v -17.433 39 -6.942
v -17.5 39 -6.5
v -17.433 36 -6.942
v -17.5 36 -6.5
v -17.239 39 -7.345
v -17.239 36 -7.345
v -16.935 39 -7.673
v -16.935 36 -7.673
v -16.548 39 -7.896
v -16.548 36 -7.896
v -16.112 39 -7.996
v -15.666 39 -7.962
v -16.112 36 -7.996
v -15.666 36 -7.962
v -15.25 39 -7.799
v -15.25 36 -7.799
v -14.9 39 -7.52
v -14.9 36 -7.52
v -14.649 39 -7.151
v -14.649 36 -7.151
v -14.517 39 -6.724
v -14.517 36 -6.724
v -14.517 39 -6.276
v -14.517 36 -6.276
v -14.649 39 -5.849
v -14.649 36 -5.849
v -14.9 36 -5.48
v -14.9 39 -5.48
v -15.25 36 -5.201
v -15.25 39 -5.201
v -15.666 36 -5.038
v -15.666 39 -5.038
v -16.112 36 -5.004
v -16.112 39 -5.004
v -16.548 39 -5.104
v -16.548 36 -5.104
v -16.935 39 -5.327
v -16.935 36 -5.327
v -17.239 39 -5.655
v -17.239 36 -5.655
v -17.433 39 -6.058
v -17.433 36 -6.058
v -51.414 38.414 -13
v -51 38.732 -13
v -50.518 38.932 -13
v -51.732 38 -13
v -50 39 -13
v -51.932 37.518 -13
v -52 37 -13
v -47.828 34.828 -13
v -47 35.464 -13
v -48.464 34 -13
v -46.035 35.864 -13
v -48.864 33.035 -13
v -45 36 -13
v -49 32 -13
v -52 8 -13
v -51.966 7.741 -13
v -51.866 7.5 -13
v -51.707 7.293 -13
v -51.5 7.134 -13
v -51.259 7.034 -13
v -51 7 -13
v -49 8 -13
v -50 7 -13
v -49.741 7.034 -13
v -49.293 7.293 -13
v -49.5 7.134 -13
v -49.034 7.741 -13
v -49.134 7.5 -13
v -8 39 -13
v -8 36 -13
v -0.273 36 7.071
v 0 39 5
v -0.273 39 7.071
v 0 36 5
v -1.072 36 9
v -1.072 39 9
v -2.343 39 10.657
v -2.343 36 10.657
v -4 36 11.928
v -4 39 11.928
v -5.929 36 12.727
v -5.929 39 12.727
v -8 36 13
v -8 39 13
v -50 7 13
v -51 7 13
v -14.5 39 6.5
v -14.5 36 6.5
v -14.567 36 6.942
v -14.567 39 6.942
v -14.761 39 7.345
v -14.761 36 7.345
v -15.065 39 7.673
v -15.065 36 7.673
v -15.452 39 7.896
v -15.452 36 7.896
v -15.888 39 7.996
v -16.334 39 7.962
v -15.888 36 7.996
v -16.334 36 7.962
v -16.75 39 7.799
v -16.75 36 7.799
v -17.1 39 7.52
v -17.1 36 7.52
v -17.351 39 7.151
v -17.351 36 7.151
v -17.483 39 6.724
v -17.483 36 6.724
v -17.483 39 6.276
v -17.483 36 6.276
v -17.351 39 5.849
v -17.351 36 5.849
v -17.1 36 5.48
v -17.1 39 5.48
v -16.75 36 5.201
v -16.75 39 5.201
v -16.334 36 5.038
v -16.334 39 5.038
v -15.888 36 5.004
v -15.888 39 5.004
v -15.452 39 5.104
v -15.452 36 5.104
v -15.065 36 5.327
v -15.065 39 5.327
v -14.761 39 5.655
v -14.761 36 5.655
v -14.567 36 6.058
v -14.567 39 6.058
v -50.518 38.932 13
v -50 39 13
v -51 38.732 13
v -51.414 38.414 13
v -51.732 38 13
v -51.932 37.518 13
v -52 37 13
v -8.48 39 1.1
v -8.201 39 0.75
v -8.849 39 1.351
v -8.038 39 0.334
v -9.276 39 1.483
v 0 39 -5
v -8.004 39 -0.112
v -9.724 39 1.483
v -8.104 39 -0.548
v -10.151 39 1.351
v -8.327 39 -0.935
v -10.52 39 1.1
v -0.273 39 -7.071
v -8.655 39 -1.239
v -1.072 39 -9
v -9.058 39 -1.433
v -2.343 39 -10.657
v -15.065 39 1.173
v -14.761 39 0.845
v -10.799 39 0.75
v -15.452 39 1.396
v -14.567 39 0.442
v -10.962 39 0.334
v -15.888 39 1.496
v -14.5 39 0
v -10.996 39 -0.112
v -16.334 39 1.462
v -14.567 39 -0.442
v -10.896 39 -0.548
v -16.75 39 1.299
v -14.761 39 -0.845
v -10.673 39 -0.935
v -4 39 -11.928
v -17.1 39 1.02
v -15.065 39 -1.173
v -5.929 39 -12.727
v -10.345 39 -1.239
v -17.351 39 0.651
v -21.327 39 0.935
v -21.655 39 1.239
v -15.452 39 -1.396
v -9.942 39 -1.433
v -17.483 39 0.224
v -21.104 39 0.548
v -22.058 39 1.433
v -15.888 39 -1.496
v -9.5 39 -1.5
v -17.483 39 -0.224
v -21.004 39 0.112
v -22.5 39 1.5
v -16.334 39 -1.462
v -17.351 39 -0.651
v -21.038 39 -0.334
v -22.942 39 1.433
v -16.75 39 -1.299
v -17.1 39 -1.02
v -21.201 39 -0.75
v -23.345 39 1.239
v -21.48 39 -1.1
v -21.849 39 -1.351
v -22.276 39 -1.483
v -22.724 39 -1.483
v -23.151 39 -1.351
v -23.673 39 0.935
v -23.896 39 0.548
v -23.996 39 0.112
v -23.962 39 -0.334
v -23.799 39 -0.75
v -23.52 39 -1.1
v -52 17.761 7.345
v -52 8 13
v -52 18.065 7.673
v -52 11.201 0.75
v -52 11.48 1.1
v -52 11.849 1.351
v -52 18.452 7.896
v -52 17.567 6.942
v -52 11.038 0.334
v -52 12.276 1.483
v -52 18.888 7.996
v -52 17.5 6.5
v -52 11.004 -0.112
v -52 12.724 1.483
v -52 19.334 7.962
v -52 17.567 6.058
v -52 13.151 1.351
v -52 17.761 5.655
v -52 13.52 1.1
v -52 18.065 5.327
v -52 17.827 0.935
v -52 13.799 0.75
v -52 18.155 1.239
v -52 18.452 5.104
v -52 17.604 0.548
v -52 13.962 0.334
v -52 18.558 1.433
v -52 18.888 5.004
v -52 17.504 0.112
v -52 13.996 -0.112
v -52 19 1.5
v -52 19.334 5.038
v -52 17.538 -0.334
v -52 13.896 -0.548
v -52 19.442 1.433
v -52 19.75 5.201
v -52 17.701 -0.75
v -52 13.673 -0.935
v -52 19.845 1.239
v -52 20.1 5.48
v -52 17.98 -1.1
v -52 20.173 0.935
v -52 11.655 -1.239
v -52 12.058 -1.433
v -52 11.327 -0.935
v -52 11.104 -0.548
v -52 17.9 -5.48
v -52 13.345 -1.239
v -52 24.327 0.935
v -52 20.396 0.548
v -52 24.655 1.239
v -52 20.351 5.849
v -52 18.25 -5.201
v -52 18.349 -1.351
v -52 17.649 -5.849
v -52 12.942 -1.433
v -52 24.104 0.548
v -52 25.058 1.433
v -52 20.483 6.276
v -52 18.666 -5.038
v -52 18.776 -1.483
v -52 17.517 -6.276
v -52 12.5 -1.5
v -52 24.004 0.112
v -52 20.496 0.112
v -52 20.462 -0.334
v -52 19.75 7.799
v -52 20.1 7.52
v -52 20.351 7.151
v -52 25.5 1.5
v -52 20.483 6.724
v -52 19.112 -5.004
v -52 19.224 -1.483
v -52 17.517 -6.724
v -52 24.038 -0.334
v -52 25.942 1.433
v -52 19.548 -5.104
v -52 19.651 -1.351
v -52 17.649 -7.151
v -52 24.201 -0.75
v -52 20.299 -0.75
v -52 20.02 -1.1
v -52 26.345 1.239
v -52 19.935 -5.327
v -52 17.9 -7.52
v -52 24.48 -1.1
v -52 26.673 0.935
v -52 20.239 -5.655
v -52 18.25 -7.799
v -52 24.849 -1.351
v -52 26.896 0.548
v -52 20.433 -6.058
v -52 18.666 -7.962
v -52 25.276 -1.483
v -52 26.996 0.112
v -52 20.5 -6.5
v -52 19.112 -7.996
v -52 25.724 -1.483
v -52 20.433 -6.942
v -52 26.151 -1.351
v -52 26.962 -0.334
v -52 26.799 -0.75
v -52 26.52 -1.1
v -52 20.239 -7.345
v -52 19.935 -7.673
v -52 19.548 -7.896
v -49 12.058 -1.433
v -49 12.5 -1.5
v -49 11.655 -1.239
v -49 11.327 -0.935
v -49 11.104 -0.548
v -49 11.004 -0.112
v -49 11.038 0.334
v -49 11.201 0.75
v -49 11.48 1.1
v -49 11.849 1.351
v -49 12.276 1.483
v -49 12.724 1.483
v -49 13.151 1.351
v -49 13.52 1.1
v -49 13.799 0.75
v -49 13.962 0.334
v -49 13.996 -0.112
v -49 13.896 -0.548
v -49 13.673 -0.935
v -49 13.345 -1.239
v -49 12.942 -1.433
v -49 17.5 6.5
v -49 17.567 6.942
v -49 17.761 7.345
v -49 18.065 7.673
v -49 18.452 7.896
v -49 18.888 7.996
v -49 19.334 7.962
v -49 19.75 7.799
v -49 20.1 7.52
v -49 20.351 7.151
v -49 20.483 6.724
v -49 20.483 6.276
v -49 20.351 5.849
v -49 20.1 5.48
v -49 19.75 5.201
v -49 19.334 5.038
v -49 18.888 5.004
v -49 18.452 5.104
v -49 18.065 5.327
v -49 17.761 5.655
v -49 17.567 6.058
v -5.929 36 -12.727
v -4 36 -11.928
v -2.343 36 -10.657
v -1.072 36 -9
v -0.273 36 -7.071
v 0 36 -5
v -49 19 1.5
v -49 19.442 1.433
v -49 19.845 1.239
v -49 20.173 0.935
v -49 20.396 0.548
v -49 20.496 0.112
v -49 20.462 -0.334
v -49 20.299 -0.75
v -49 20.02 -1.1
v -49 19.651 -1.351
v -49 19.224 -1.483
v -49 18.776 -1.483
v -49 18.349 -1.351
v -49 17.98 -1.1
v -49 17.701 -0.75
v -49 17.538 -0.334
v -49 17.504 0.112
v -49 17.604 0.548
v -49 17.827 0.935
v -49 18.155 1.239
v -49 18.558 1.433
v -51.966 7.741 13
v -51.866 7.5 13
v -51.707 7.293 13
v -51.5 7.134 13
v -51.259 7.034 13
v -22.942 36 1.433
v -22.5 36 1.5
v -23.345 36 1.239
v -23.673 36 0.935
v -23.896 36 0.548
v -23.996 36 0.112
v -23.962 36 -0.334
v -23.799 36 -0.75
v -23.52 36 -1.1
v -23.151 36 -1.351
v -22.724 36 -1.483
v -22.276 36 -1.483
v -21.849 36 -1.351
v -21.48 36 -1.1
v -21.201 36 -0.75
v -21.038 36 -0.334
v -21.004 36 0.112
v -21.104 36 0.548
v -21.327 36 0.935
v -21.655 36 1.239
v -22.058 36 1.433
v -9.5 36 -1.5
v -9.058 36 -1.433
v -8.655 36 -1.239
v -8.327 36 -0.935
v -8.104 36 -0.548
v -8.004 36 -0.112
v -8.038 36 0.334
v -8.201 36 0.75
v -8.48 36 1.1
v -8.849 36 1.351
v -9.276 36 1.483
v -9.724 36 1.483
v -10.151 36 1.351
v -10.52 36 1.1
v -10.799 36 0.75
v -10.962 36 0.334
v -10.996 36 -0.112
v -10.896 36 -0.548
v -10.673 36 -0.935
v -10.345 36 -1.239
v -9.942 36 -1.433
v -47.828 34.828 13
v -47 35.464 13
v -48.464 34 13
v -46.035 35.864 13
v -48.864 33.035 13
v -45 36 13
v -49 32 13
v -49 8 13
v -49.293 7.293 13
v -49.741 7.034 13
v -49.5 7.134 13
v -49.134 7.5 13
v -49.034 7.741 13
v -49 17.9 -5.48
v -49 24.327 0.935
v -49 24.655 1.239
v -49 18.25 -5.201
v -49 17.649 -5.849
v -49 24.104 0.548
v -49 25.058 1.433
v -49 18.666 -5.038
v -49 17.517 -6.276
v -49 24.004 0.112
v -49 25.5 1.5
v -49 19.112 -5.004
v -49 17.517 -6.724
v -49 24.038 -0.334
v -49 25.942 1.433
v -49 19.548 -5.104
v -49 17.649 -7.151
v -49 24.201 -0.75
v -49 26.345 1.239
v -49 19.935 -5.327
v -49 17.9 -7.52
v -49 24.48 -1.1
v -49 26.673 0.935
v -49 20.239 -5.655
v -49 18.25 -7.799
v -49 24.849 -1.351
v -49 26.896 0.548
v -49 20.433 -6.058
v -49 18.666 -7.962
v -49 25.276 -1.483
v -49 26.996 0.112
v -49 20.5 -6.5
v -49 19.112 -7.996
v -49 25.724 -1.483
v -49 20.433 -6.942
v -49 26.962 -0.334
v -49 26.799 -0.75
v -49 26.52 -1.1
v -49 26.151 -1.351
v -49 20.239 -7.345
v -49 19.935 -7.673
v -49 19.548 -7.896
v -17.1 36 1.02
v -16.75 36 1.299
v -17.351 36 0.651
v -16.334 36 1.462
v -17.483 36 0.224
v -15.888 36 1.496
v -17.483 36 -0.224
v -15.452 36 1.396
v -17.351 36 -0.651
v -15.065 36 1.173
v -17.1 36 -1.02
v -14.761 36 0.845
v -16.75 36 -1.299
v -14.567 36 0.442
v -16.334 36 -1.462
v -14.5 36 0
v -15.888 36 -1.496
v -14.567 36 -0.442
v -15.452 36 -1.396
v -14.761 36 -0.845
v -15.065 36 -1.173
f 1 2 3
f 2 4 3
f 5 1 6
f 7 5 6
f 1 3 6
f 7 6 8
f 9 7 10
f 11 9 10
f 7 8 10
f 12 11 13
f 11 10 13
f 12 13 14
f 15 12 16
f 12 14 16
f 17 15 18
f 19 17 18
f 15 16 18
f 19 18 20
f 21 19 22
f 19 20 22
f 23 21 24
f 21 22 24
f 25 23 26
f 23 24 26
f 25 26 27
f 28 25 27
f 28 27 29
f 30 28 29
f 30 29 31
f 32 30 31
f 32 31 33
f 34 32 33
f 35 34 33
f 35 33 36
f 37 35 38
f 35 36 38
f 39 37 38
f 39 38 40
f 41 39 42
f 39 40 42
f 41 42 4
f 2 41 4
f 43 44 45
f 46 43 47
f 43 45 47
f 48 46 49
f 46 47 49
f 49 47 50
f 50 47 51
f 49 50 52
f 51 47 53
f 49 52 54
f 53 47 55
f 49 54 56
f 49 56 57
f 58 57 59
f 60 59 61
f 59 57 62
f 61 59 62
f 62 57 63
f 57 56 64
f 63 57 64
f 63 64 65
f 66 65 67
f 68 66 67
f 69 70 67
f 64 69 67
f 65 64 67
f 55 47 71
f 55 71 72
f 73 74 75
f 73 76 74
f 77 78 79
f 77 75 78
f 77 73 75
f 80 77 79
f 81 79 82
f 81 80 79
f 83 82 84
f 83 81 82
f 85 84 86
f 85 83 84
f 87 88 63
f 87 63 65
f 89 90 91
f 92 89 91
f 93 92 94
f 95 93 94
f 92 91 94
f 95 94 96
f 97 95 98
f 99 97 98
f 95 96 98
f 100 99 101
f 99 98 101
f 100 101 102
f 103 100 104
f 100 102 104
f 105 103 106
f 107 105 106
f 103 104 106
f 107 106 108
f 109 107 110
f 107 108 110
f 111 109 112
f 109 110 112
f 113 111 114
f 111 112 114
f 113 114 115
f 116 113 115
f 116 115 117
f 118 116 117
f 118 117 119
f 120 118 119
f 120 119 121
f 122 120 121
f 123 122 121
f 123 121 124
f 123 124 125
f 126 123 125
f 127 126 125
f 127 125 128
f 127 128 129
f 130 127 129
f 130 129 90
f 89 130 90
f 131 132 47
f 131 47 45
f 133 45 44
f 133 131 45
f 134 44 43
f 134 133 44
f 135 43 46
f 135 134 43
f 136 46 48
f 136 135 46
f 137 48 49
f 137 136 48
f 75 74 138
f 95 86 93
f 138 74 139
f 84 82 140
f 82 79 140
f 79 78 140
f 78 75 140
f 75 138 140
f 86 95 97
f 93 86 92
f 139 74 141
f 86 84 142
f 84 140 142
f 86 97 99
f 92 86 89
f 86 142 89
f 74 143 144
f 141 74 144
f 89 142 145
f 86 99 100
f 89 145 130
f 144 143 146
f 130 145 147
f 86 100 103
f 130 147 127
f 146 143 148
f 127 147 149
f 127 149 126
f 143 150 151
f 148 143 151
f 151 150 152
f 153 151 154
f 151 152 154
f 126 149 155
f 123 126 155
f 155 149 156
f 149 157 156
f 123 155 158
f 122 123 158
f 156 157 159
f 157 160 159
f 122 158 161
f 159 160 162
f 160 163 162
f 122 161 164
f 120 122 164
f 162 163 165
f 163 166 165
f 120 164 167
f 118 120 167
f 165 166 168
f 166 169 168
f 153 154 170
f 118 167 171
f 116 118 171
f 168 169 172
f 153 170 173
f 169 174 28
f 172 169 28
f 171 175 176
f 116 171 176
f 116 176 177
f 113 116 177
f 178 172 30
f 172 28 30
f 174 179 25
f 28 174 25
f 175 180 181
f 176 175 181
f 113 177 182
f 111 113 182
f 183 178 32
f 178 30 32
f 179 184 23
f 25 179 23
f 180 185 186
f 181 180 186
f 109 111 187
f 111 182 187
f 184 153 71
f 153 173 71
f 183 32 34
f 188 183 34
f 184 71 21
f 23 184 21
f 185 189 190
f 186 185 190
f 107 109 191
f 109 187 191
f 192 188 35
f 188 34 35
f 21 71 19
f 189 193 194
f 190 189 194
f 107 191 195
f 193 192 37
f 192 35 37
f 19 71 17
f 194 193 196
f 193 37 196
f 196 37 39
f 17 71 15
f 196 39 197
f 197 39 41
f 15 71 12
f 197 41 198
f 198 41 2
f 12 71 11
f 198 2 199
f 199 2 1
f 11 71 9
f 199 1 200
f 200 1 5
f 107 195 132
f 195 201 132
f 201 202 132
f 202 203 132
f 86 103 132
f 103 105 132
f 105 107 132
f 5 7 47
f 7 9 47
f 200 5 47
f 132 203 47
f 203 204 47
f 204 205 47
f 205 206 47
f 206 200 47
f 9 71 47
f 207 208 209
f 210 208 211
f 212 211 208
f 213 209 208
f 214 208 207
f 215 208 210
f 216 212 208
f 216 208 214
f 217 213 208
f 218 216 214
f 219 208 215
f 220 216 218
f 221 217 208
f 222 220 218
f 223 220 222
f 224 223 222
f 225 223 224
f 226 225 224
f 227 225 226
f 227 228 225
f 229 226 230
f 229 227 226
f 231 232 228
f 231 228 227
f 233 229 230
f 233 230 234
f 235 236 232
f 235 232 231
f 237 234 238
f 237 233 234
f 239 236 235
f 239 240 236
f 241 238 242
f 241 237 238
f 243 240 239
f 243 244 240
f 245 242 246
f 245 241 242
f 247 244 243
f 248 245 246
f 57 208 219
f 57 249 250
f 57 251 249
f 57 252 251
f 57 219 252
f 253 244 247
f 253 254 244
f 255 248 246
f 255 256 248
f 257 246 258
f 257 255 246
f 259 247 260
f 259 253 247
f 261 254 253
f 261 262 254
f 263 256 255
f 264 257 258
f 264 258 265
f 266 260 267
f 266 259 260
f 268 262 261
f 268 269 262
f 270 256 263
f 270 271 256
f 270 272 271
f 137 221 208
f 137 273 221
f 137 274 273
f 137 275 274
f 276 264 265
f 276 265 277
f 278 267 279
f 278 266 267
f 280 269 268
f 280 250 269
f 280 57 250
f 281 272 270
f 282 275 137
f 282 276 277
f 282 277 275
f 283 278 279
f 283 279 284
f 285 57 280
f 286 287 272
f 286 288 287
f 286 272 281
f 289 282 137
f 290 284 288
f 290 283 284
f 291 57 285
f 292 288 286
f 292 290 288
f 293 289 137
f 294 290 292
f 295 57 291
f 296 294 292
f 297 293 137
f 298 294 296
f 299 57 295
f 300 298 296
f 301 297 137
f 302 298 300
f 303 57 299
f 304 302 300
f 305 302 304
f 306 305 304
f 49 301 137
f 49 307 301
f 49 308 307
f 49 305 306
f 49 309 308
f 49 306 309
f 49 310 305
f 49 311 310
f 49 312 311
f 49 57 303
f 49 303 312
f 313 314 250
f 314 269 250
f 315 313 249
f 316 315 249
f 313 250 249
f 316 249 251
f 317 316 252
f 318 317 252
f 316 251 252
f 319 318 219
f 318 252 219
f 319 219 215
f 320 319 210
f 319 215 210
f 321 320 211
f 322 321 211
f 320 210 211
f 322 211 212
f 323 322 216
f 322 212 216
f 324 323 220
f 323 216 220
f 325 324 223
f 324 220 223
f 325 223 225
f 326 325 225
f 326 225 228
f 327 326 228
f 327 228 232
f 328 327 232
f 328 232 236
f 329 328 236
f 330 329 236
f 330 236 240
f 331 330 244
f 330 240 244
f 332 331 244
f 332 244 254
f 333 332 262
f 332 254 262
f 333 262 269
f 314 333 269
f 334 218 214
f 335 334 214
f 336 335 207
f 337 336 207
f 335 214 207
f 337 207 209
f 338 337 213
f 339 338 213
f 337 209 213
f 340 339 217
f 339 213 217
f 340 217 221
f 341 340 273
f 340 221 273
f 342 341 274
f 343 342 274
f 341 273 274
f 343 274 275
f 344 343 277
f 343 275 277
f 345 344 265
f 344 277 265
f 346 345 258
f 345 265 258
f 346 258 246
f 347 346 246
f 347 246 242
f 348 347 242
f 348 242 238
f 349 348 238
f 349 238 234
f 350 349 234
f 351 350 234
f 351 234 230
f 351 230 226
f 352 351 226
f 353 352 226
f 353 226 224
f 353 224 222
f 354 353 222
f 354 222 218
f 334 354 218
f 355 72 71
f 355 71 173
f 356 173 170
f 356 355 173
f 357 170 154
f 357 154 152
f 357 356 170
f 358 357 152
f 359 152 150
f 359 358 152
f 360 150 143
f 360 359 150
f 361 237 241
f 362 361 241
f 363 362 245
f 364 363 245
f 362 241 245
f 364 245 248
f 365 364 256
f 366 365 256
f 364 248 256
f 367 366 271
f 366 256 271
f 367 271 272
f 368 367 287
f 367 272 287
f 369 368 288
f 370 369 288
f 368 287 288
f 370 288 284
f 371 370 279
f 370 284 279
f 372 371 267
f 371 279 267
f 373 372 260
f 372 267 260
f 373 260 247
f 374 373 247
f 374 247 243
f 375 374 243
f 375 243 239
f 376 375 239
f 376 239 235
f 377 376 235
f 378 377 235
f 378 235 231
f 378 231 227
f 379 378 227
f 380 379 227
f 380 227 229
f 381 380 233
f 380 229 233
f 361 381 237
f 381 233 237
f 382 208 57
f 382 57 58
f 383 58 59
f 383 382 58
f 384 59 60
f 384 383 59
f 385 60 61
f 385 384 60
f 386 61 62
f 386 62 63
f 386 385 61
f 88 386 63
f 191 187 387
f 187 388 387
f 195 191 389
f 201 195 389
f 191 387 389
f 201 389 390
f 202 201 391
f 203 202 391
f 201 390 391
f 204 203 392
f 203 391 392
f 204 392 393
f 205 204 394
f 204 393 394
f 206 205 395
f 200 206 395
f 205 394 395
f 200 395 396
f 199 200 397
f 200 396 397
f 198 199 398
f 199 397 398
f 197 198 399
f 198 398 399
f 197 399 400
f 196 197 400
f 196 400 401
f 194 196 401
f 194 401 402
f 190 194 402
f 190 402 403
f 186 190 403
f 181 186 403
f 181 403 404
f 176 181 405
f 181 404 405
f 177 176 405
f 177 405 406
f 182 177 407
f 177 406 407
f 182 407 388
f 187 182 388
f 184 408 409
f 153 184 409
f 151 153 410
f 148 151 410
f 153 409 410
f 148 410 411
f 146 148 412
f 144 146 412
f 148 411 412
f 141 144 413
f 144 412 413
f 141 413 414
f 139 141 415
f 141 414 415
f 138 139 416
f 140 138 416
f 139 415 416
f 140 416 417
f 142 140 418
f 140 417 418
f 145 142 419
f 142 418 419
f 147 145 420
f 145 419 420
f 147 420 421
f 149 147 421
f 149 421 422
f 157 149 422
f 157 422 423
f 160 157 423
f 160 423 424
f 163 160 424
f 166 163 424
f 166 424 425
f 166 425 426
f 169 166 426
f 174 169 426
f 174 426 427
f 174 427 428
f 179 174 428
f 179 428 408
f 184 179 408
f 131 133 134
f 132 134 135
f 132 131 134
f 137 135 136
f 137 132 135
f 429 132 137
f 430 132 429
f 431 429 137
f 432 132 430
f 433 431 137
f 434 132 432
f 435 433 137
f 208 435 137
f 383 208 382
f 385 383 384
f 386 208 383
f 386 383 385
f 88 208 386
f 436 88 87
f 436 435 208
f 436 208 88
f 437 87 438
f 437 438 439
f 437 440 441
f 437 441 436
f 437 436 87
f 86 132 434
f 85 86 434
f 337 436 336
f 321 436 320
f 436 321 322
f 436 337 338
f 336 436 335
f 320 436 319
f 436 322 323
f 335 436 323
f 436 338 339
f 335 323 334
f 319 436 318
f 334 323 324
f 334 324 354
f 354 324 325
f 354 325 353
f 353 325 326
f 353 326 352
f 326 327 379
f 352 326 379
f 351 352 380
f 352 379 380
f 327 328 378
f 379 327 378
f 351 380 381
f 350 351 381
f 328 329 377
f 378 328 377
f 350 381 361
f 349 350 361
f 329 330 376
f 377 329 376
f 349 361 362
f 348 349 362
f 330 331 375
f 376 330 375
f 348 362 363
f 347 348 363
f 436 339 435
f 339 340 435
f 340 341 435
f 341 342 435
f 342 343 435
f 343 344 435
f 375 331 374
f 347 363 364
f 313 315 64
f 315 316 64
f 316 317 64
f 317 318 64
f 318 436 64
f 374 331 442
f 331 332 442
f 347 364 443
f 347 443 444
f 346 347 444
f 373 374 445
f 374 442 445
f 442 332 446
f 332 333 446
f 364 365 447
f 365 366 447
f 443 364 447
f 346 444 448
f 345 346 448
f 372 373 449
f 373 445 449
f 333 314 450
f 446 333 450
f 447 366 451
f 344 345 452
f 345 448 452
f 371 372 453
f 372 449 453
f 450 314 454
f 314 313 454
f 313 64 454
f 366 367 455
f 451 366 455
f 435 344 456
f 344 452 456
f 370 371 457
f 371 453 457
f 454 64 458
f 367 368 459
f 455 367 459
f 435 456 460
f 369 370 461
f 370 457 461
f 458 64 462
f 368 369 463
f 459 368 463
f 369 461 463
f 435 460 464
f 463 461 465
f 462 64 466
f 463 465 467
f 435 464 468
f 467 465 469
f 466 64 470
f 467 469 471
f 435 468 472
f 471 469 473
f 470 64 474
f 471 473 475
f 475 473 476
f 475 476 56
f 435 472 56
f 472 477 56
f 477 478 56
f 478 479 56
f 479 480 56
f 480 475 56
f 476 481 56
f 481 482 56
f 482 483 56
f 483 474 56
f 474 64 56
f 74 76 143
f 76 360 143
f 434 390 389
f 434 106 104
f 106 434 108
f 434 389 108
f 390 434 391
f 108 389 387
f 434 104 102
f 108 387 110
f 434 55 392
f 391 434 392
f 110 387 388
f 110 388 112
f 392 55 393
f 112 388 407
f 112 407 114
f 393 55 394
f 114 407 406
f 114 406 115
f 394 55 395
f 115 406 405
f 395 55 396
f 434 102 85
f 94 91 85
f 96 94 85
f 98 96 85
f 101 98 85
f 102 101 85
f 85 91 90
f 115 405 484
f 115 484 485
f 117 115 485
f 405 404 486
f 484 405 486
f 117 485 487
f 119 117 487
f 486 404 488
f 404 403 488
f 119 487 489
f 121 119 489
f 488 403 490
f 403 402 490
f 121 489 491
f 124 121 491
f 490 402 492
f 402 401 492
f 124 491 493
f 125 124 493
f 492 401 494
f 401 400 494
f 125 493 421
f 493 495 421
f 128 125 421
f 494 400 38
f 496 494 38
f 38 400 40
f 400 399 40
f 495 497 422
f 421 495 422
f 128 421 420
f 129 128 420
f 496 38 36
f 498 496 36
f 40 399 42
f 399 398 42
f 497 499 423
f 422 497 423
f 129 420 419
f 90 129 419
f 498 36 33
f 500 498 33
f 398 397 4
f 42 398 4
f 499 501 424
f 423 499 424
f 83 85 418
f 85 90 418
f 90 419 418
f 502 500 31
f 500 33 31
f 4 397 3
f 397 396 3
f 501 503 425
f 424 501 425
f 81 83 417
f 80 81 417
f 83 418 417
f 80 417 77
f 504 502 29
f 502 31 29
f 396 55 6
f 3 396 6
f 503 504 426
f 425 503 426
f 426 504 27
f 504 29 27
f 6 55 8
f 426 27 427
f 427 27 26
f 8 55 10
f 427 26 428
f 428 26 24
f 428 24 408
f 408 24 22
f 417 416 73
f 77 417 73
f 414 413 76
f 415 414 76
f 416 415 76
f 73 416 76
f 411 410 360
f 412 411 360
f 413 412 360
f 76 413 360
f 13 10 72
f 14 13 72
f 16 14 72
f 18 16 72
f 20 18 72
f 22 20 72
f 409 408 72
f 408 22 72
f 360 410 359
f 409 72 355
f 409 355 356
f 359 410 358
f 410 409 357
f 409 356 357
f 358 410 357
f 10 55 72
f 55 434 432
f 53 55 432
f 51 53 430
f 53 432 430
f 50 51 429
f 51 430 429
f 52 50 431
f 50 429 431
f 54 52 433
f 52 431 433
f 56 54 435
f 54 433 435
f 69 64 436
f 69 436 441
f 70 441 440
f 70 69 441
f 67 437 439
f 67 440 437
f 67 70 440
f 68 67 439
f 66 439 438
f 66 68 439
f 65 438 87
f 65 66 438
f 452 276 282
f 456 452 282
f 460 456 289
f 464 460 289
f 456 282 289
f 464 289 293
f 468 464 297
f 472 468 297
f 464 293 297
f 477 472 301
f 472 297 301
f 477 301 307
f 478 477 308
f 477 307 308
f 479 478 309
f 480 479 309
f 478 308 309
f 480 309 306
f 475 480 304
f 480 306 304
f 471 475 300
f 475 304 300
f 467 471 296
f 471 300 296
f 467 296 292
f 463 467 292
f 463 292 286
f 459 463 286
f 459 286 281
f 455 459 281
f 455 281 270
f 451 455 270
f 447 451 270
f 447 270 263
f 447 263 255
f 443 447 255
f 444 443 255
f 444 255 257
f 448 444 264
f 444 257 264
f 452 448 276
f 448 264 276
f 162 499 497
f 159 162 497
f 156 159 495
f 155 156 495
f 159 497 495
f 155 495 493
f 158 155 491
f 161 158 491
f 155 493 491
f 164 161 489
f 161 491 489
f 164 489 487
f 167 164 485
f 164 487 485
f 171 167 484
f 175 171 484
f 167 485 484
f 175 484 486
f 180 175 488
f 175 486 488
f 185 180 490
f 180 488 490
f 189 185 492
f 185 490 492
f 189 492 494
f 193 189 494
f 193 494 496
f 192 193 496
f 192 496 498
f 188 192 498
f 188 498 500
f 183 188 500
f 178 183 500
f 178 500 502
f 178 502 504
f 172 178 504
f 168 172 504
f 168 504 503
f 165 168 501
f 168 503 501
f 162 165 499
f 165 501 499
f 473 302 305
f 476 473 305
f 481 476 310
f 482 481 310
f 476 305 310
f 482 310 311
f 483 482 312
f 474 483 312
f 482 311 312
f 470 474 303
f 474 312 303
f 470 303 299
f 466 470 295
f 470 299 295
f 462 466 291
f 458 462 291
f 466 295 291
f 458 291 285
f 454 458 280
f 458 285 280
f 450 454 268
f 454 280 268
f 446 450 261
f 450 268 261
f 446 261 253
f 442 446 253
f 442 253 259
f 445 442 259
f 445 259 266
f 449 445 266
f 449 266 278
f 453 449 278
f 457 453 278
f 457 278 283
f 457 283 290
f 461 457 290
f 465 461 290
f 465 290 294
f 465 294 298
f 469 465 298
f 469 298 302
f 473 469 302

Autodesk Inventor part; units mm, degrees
ref_plane "YZ Plane" through (0, 0, 0) normal (1, 0, 0) x (0, 1, 0)
ref_plane "XZ Plane" through (0, 0, 0) normal (0, 1, 0) x (-1, 0, 0)
ref_plane "XY Plane" through (0, 0, 0) normal (0, 0, 1) x (1, 0, 0)
sketch "Sketch1" plane through (0, 0, 0) normal (0, 0, 1) x (1, 0, 0)
  line L0 (0, 0) -> (-49, 0)
  line L1 (-49, 0) -> (-49, 18)
  line L2 (-49, 18) -> (0, 18) construction
  line L3 (-49, 18) -> (-52, 18)
  line L4 (-52, 18) -> (-52, -3)
  line L5 (-52, -3) -> (0, -3)
  line L6 (0, -3) -> (0, 0)
  dimension "d0" = 18
  dimension "d1" = 3
  dimension "d2" = 3
  dimension "d3" = 52
extrude "Extrusion1" add sketch "Sketch1" along normal blind 10
mirror "Mirror1" about plane through (-32.0411, 1.4589, 0) normal (0, 0, -1) of "Extrusion1"
mirror "Mirror2" about plane through (-49, 18, 0) normal (0, 1, 0) of "Extrusion1", "Mirror1"
sketch "Sketch4" plane through (0, -3, -10) normal (0, 0, -1) x (-1, 0, 0)
  line L0 (0, 3) -> (49, 3) projected
  line L1 (0, 0) -> (0, 3) projected
  line L2 (52, 0) -> (0, 0) projected
  line L3 (52, 42) -> (52, 0) projected
  line L4 (52, 42) -> (0, 42) projected
  line L5 (0, 42) -> (0, 39) projected
  line L6 (0, 39) -> (49, 39) projected
  line L7 (49, 39) -> (49, 3) projected
  line L8 (0, 3) -> (49, 3) projected
  line L9 (0, 0) -> (0, 3) projected
  line L10 (52, 0) -> (0, 0) projected
  line L11 (52, 42) -> (52, 0) projected
  line L12 (52, 42) -> (0, 42) projected
  line L13 (0, 42) -> (0, 39) projected
  line L14 (0, 39) -> (49, 39) projected
  line L15 (49, 39) -> (49, 3) projected
extrude "Extrusion4" add sketch "Sketch4" along normal blind 5
mirror "Mirror3" about plane through (0, 0, 0) normal (0, 0, 1) of "Extrusion4"
sketch "Sketch11" plane through (-52, -3, -15) normal (0, -1, 0) x (1, 0, 0)
  line L0 (52, 0) -> (52, 30) projected
  line L1 (52, 30) -> (0, 30) projected
  line L2 (0, 0) -> (0, 30) projected
  line L3 (52, 0) -> (0, 0) projected
  line L4 (52, 0) -> (52, 30) projected
  line L5 (52, 30) -> (0, 30) projected
  line L6 (0, 0) -> (0, 30) projected
  line L7 (52, 0) -> (0, 0) projected
  point P0 (52, 15)
extrude "Extrusion11" cut sketch "Sketch11" against normal blind 10
sketch "Sketch13" plane through (0, 36, -15) normal (1, 0, 0) x (0, 0, -1)
  line L0 (-30, 3) -> (-28, 3)
  line L1 (-28, 3) -> (-28, -29)
  line L2 (-28, -29) -> (-30, -29)
  line L3 (-30, -29) -> (-30, 3)
  line L4 (-30, -29) -> (0, -29) projected
  point P0 (-15, -36)
  dimension "d65" = 2
extrude "Extrusion13" cut sketch "Sketch13" against normal up to next
mirror "Mirror4" about plane through (0, 0, 0) normal (0, 0, 1) of "Extrusion13"
sketch "Sketch14" plane through (-52, 7, 13) normal (-1, 0, 0) x (0, 0, 1)
  line L0 (-26, 32) -> (-26, 0) projected
  line L1 (-26, 0) -> (0, 0) projected
  line L2 (0, 32) -> (-26, 32) projected
  circle A0 centre (-13, 12) radius 6.5 construction
  line L3 (-13, 12) -> (-26, 12) construction
  line L4 (-13, 12) -> (-13, 32) construction
  circle A1 centre (-13, 12) radius 1.5
  circle A2 centre (-13, 18.5) radius 1.5
  point P0 (-13, -7)
  point P1 (-13, 0)
  dimension "d68" = 13
  dimension "d69" = 20
  dimension "d71" = 3
  dimension "d72" = 3
extrude "Extrusion14" cut sketch "Sketch14" against normal up to next
pattern_circular "Circular Pattern6" count 4 over 360 about axis through (-52, 19, 0) along (1, 0, 0) of "Extrusion14"
sketch "Sketch15" plane through (-49, 36, 13) normal (0, -1, 0) x (1, 0, 0)
  line L0 (49, -26) -> (49, 0) projected
  line L1 (49, 0) -> (0, 0) projected
  circle A0 centre (33, -13) radius 6.5 construction
  line L2 (33, -13) -> (33, 0) construction
  circle A1 centre (33, -6.5) radius 1.5
  circle A2 centre (33, -13) radius 1.5
  point P0 (49, -13)
  point P1 (49, -13)
  dimension "d78" = 13
  dimension "d79" = 16
  dimension "d80" = 3
  dimension "d81" = 3
extrude "Extrusion15" cut sketch "Sketch15" against normal up to next
pattern_circular "Circular Pattern7" count 4 over 360 about axis through (-16, 36, 0) along (0, 1, 0) of "Extrusion15"
fillet "Fillet1" radius 8 2 edges at (0, 37.5, -13) (0, 37.5, 13)
sketch "Sketch18" plane through (-52, 39, 13) normal (0, 1, 0) x (1, 0, 0)
  arc A0 (44, 0) -> (52, 8) centre (44, 8) ccw projected
  line L0 (52, 8) -> (52, 18) projected
  arc A1 (52, 18) -> (44, 26) centre (44, 18) ccw projected
  line L1 (44, 26) -> (0, 26) projected
  line L2 (0, 0) -> (0, 26) projected
  line L3 (0, 0) -> (44, 0) projected
  circle A2 centre (36, 13) radius 1.5 projected
  circle A3 centre (36, 6.5) radius 1.5 projected
  circle A4 centre (29.5, 13) radius 1.5 projected
  circle A5 centre (42.5, 13) radius 1.5 projected
  circle A6 centre (36, 19.5) radius 1.5 projected
  point P0 (52, 13)
  dimension "d93" = 26
fillet "Fillet2" radius 4 1 edges at (-49, 36, 0)
fillet "Fillet3" radius 2 1 edges at (-52, 39, 0)
fillet "Fillet4" radius 1 2 edges at (-49, 7, 0) (-52, 7, 0)
equation "\"d72\" = d71"
properties part number "L_micro_sergei_dines"
